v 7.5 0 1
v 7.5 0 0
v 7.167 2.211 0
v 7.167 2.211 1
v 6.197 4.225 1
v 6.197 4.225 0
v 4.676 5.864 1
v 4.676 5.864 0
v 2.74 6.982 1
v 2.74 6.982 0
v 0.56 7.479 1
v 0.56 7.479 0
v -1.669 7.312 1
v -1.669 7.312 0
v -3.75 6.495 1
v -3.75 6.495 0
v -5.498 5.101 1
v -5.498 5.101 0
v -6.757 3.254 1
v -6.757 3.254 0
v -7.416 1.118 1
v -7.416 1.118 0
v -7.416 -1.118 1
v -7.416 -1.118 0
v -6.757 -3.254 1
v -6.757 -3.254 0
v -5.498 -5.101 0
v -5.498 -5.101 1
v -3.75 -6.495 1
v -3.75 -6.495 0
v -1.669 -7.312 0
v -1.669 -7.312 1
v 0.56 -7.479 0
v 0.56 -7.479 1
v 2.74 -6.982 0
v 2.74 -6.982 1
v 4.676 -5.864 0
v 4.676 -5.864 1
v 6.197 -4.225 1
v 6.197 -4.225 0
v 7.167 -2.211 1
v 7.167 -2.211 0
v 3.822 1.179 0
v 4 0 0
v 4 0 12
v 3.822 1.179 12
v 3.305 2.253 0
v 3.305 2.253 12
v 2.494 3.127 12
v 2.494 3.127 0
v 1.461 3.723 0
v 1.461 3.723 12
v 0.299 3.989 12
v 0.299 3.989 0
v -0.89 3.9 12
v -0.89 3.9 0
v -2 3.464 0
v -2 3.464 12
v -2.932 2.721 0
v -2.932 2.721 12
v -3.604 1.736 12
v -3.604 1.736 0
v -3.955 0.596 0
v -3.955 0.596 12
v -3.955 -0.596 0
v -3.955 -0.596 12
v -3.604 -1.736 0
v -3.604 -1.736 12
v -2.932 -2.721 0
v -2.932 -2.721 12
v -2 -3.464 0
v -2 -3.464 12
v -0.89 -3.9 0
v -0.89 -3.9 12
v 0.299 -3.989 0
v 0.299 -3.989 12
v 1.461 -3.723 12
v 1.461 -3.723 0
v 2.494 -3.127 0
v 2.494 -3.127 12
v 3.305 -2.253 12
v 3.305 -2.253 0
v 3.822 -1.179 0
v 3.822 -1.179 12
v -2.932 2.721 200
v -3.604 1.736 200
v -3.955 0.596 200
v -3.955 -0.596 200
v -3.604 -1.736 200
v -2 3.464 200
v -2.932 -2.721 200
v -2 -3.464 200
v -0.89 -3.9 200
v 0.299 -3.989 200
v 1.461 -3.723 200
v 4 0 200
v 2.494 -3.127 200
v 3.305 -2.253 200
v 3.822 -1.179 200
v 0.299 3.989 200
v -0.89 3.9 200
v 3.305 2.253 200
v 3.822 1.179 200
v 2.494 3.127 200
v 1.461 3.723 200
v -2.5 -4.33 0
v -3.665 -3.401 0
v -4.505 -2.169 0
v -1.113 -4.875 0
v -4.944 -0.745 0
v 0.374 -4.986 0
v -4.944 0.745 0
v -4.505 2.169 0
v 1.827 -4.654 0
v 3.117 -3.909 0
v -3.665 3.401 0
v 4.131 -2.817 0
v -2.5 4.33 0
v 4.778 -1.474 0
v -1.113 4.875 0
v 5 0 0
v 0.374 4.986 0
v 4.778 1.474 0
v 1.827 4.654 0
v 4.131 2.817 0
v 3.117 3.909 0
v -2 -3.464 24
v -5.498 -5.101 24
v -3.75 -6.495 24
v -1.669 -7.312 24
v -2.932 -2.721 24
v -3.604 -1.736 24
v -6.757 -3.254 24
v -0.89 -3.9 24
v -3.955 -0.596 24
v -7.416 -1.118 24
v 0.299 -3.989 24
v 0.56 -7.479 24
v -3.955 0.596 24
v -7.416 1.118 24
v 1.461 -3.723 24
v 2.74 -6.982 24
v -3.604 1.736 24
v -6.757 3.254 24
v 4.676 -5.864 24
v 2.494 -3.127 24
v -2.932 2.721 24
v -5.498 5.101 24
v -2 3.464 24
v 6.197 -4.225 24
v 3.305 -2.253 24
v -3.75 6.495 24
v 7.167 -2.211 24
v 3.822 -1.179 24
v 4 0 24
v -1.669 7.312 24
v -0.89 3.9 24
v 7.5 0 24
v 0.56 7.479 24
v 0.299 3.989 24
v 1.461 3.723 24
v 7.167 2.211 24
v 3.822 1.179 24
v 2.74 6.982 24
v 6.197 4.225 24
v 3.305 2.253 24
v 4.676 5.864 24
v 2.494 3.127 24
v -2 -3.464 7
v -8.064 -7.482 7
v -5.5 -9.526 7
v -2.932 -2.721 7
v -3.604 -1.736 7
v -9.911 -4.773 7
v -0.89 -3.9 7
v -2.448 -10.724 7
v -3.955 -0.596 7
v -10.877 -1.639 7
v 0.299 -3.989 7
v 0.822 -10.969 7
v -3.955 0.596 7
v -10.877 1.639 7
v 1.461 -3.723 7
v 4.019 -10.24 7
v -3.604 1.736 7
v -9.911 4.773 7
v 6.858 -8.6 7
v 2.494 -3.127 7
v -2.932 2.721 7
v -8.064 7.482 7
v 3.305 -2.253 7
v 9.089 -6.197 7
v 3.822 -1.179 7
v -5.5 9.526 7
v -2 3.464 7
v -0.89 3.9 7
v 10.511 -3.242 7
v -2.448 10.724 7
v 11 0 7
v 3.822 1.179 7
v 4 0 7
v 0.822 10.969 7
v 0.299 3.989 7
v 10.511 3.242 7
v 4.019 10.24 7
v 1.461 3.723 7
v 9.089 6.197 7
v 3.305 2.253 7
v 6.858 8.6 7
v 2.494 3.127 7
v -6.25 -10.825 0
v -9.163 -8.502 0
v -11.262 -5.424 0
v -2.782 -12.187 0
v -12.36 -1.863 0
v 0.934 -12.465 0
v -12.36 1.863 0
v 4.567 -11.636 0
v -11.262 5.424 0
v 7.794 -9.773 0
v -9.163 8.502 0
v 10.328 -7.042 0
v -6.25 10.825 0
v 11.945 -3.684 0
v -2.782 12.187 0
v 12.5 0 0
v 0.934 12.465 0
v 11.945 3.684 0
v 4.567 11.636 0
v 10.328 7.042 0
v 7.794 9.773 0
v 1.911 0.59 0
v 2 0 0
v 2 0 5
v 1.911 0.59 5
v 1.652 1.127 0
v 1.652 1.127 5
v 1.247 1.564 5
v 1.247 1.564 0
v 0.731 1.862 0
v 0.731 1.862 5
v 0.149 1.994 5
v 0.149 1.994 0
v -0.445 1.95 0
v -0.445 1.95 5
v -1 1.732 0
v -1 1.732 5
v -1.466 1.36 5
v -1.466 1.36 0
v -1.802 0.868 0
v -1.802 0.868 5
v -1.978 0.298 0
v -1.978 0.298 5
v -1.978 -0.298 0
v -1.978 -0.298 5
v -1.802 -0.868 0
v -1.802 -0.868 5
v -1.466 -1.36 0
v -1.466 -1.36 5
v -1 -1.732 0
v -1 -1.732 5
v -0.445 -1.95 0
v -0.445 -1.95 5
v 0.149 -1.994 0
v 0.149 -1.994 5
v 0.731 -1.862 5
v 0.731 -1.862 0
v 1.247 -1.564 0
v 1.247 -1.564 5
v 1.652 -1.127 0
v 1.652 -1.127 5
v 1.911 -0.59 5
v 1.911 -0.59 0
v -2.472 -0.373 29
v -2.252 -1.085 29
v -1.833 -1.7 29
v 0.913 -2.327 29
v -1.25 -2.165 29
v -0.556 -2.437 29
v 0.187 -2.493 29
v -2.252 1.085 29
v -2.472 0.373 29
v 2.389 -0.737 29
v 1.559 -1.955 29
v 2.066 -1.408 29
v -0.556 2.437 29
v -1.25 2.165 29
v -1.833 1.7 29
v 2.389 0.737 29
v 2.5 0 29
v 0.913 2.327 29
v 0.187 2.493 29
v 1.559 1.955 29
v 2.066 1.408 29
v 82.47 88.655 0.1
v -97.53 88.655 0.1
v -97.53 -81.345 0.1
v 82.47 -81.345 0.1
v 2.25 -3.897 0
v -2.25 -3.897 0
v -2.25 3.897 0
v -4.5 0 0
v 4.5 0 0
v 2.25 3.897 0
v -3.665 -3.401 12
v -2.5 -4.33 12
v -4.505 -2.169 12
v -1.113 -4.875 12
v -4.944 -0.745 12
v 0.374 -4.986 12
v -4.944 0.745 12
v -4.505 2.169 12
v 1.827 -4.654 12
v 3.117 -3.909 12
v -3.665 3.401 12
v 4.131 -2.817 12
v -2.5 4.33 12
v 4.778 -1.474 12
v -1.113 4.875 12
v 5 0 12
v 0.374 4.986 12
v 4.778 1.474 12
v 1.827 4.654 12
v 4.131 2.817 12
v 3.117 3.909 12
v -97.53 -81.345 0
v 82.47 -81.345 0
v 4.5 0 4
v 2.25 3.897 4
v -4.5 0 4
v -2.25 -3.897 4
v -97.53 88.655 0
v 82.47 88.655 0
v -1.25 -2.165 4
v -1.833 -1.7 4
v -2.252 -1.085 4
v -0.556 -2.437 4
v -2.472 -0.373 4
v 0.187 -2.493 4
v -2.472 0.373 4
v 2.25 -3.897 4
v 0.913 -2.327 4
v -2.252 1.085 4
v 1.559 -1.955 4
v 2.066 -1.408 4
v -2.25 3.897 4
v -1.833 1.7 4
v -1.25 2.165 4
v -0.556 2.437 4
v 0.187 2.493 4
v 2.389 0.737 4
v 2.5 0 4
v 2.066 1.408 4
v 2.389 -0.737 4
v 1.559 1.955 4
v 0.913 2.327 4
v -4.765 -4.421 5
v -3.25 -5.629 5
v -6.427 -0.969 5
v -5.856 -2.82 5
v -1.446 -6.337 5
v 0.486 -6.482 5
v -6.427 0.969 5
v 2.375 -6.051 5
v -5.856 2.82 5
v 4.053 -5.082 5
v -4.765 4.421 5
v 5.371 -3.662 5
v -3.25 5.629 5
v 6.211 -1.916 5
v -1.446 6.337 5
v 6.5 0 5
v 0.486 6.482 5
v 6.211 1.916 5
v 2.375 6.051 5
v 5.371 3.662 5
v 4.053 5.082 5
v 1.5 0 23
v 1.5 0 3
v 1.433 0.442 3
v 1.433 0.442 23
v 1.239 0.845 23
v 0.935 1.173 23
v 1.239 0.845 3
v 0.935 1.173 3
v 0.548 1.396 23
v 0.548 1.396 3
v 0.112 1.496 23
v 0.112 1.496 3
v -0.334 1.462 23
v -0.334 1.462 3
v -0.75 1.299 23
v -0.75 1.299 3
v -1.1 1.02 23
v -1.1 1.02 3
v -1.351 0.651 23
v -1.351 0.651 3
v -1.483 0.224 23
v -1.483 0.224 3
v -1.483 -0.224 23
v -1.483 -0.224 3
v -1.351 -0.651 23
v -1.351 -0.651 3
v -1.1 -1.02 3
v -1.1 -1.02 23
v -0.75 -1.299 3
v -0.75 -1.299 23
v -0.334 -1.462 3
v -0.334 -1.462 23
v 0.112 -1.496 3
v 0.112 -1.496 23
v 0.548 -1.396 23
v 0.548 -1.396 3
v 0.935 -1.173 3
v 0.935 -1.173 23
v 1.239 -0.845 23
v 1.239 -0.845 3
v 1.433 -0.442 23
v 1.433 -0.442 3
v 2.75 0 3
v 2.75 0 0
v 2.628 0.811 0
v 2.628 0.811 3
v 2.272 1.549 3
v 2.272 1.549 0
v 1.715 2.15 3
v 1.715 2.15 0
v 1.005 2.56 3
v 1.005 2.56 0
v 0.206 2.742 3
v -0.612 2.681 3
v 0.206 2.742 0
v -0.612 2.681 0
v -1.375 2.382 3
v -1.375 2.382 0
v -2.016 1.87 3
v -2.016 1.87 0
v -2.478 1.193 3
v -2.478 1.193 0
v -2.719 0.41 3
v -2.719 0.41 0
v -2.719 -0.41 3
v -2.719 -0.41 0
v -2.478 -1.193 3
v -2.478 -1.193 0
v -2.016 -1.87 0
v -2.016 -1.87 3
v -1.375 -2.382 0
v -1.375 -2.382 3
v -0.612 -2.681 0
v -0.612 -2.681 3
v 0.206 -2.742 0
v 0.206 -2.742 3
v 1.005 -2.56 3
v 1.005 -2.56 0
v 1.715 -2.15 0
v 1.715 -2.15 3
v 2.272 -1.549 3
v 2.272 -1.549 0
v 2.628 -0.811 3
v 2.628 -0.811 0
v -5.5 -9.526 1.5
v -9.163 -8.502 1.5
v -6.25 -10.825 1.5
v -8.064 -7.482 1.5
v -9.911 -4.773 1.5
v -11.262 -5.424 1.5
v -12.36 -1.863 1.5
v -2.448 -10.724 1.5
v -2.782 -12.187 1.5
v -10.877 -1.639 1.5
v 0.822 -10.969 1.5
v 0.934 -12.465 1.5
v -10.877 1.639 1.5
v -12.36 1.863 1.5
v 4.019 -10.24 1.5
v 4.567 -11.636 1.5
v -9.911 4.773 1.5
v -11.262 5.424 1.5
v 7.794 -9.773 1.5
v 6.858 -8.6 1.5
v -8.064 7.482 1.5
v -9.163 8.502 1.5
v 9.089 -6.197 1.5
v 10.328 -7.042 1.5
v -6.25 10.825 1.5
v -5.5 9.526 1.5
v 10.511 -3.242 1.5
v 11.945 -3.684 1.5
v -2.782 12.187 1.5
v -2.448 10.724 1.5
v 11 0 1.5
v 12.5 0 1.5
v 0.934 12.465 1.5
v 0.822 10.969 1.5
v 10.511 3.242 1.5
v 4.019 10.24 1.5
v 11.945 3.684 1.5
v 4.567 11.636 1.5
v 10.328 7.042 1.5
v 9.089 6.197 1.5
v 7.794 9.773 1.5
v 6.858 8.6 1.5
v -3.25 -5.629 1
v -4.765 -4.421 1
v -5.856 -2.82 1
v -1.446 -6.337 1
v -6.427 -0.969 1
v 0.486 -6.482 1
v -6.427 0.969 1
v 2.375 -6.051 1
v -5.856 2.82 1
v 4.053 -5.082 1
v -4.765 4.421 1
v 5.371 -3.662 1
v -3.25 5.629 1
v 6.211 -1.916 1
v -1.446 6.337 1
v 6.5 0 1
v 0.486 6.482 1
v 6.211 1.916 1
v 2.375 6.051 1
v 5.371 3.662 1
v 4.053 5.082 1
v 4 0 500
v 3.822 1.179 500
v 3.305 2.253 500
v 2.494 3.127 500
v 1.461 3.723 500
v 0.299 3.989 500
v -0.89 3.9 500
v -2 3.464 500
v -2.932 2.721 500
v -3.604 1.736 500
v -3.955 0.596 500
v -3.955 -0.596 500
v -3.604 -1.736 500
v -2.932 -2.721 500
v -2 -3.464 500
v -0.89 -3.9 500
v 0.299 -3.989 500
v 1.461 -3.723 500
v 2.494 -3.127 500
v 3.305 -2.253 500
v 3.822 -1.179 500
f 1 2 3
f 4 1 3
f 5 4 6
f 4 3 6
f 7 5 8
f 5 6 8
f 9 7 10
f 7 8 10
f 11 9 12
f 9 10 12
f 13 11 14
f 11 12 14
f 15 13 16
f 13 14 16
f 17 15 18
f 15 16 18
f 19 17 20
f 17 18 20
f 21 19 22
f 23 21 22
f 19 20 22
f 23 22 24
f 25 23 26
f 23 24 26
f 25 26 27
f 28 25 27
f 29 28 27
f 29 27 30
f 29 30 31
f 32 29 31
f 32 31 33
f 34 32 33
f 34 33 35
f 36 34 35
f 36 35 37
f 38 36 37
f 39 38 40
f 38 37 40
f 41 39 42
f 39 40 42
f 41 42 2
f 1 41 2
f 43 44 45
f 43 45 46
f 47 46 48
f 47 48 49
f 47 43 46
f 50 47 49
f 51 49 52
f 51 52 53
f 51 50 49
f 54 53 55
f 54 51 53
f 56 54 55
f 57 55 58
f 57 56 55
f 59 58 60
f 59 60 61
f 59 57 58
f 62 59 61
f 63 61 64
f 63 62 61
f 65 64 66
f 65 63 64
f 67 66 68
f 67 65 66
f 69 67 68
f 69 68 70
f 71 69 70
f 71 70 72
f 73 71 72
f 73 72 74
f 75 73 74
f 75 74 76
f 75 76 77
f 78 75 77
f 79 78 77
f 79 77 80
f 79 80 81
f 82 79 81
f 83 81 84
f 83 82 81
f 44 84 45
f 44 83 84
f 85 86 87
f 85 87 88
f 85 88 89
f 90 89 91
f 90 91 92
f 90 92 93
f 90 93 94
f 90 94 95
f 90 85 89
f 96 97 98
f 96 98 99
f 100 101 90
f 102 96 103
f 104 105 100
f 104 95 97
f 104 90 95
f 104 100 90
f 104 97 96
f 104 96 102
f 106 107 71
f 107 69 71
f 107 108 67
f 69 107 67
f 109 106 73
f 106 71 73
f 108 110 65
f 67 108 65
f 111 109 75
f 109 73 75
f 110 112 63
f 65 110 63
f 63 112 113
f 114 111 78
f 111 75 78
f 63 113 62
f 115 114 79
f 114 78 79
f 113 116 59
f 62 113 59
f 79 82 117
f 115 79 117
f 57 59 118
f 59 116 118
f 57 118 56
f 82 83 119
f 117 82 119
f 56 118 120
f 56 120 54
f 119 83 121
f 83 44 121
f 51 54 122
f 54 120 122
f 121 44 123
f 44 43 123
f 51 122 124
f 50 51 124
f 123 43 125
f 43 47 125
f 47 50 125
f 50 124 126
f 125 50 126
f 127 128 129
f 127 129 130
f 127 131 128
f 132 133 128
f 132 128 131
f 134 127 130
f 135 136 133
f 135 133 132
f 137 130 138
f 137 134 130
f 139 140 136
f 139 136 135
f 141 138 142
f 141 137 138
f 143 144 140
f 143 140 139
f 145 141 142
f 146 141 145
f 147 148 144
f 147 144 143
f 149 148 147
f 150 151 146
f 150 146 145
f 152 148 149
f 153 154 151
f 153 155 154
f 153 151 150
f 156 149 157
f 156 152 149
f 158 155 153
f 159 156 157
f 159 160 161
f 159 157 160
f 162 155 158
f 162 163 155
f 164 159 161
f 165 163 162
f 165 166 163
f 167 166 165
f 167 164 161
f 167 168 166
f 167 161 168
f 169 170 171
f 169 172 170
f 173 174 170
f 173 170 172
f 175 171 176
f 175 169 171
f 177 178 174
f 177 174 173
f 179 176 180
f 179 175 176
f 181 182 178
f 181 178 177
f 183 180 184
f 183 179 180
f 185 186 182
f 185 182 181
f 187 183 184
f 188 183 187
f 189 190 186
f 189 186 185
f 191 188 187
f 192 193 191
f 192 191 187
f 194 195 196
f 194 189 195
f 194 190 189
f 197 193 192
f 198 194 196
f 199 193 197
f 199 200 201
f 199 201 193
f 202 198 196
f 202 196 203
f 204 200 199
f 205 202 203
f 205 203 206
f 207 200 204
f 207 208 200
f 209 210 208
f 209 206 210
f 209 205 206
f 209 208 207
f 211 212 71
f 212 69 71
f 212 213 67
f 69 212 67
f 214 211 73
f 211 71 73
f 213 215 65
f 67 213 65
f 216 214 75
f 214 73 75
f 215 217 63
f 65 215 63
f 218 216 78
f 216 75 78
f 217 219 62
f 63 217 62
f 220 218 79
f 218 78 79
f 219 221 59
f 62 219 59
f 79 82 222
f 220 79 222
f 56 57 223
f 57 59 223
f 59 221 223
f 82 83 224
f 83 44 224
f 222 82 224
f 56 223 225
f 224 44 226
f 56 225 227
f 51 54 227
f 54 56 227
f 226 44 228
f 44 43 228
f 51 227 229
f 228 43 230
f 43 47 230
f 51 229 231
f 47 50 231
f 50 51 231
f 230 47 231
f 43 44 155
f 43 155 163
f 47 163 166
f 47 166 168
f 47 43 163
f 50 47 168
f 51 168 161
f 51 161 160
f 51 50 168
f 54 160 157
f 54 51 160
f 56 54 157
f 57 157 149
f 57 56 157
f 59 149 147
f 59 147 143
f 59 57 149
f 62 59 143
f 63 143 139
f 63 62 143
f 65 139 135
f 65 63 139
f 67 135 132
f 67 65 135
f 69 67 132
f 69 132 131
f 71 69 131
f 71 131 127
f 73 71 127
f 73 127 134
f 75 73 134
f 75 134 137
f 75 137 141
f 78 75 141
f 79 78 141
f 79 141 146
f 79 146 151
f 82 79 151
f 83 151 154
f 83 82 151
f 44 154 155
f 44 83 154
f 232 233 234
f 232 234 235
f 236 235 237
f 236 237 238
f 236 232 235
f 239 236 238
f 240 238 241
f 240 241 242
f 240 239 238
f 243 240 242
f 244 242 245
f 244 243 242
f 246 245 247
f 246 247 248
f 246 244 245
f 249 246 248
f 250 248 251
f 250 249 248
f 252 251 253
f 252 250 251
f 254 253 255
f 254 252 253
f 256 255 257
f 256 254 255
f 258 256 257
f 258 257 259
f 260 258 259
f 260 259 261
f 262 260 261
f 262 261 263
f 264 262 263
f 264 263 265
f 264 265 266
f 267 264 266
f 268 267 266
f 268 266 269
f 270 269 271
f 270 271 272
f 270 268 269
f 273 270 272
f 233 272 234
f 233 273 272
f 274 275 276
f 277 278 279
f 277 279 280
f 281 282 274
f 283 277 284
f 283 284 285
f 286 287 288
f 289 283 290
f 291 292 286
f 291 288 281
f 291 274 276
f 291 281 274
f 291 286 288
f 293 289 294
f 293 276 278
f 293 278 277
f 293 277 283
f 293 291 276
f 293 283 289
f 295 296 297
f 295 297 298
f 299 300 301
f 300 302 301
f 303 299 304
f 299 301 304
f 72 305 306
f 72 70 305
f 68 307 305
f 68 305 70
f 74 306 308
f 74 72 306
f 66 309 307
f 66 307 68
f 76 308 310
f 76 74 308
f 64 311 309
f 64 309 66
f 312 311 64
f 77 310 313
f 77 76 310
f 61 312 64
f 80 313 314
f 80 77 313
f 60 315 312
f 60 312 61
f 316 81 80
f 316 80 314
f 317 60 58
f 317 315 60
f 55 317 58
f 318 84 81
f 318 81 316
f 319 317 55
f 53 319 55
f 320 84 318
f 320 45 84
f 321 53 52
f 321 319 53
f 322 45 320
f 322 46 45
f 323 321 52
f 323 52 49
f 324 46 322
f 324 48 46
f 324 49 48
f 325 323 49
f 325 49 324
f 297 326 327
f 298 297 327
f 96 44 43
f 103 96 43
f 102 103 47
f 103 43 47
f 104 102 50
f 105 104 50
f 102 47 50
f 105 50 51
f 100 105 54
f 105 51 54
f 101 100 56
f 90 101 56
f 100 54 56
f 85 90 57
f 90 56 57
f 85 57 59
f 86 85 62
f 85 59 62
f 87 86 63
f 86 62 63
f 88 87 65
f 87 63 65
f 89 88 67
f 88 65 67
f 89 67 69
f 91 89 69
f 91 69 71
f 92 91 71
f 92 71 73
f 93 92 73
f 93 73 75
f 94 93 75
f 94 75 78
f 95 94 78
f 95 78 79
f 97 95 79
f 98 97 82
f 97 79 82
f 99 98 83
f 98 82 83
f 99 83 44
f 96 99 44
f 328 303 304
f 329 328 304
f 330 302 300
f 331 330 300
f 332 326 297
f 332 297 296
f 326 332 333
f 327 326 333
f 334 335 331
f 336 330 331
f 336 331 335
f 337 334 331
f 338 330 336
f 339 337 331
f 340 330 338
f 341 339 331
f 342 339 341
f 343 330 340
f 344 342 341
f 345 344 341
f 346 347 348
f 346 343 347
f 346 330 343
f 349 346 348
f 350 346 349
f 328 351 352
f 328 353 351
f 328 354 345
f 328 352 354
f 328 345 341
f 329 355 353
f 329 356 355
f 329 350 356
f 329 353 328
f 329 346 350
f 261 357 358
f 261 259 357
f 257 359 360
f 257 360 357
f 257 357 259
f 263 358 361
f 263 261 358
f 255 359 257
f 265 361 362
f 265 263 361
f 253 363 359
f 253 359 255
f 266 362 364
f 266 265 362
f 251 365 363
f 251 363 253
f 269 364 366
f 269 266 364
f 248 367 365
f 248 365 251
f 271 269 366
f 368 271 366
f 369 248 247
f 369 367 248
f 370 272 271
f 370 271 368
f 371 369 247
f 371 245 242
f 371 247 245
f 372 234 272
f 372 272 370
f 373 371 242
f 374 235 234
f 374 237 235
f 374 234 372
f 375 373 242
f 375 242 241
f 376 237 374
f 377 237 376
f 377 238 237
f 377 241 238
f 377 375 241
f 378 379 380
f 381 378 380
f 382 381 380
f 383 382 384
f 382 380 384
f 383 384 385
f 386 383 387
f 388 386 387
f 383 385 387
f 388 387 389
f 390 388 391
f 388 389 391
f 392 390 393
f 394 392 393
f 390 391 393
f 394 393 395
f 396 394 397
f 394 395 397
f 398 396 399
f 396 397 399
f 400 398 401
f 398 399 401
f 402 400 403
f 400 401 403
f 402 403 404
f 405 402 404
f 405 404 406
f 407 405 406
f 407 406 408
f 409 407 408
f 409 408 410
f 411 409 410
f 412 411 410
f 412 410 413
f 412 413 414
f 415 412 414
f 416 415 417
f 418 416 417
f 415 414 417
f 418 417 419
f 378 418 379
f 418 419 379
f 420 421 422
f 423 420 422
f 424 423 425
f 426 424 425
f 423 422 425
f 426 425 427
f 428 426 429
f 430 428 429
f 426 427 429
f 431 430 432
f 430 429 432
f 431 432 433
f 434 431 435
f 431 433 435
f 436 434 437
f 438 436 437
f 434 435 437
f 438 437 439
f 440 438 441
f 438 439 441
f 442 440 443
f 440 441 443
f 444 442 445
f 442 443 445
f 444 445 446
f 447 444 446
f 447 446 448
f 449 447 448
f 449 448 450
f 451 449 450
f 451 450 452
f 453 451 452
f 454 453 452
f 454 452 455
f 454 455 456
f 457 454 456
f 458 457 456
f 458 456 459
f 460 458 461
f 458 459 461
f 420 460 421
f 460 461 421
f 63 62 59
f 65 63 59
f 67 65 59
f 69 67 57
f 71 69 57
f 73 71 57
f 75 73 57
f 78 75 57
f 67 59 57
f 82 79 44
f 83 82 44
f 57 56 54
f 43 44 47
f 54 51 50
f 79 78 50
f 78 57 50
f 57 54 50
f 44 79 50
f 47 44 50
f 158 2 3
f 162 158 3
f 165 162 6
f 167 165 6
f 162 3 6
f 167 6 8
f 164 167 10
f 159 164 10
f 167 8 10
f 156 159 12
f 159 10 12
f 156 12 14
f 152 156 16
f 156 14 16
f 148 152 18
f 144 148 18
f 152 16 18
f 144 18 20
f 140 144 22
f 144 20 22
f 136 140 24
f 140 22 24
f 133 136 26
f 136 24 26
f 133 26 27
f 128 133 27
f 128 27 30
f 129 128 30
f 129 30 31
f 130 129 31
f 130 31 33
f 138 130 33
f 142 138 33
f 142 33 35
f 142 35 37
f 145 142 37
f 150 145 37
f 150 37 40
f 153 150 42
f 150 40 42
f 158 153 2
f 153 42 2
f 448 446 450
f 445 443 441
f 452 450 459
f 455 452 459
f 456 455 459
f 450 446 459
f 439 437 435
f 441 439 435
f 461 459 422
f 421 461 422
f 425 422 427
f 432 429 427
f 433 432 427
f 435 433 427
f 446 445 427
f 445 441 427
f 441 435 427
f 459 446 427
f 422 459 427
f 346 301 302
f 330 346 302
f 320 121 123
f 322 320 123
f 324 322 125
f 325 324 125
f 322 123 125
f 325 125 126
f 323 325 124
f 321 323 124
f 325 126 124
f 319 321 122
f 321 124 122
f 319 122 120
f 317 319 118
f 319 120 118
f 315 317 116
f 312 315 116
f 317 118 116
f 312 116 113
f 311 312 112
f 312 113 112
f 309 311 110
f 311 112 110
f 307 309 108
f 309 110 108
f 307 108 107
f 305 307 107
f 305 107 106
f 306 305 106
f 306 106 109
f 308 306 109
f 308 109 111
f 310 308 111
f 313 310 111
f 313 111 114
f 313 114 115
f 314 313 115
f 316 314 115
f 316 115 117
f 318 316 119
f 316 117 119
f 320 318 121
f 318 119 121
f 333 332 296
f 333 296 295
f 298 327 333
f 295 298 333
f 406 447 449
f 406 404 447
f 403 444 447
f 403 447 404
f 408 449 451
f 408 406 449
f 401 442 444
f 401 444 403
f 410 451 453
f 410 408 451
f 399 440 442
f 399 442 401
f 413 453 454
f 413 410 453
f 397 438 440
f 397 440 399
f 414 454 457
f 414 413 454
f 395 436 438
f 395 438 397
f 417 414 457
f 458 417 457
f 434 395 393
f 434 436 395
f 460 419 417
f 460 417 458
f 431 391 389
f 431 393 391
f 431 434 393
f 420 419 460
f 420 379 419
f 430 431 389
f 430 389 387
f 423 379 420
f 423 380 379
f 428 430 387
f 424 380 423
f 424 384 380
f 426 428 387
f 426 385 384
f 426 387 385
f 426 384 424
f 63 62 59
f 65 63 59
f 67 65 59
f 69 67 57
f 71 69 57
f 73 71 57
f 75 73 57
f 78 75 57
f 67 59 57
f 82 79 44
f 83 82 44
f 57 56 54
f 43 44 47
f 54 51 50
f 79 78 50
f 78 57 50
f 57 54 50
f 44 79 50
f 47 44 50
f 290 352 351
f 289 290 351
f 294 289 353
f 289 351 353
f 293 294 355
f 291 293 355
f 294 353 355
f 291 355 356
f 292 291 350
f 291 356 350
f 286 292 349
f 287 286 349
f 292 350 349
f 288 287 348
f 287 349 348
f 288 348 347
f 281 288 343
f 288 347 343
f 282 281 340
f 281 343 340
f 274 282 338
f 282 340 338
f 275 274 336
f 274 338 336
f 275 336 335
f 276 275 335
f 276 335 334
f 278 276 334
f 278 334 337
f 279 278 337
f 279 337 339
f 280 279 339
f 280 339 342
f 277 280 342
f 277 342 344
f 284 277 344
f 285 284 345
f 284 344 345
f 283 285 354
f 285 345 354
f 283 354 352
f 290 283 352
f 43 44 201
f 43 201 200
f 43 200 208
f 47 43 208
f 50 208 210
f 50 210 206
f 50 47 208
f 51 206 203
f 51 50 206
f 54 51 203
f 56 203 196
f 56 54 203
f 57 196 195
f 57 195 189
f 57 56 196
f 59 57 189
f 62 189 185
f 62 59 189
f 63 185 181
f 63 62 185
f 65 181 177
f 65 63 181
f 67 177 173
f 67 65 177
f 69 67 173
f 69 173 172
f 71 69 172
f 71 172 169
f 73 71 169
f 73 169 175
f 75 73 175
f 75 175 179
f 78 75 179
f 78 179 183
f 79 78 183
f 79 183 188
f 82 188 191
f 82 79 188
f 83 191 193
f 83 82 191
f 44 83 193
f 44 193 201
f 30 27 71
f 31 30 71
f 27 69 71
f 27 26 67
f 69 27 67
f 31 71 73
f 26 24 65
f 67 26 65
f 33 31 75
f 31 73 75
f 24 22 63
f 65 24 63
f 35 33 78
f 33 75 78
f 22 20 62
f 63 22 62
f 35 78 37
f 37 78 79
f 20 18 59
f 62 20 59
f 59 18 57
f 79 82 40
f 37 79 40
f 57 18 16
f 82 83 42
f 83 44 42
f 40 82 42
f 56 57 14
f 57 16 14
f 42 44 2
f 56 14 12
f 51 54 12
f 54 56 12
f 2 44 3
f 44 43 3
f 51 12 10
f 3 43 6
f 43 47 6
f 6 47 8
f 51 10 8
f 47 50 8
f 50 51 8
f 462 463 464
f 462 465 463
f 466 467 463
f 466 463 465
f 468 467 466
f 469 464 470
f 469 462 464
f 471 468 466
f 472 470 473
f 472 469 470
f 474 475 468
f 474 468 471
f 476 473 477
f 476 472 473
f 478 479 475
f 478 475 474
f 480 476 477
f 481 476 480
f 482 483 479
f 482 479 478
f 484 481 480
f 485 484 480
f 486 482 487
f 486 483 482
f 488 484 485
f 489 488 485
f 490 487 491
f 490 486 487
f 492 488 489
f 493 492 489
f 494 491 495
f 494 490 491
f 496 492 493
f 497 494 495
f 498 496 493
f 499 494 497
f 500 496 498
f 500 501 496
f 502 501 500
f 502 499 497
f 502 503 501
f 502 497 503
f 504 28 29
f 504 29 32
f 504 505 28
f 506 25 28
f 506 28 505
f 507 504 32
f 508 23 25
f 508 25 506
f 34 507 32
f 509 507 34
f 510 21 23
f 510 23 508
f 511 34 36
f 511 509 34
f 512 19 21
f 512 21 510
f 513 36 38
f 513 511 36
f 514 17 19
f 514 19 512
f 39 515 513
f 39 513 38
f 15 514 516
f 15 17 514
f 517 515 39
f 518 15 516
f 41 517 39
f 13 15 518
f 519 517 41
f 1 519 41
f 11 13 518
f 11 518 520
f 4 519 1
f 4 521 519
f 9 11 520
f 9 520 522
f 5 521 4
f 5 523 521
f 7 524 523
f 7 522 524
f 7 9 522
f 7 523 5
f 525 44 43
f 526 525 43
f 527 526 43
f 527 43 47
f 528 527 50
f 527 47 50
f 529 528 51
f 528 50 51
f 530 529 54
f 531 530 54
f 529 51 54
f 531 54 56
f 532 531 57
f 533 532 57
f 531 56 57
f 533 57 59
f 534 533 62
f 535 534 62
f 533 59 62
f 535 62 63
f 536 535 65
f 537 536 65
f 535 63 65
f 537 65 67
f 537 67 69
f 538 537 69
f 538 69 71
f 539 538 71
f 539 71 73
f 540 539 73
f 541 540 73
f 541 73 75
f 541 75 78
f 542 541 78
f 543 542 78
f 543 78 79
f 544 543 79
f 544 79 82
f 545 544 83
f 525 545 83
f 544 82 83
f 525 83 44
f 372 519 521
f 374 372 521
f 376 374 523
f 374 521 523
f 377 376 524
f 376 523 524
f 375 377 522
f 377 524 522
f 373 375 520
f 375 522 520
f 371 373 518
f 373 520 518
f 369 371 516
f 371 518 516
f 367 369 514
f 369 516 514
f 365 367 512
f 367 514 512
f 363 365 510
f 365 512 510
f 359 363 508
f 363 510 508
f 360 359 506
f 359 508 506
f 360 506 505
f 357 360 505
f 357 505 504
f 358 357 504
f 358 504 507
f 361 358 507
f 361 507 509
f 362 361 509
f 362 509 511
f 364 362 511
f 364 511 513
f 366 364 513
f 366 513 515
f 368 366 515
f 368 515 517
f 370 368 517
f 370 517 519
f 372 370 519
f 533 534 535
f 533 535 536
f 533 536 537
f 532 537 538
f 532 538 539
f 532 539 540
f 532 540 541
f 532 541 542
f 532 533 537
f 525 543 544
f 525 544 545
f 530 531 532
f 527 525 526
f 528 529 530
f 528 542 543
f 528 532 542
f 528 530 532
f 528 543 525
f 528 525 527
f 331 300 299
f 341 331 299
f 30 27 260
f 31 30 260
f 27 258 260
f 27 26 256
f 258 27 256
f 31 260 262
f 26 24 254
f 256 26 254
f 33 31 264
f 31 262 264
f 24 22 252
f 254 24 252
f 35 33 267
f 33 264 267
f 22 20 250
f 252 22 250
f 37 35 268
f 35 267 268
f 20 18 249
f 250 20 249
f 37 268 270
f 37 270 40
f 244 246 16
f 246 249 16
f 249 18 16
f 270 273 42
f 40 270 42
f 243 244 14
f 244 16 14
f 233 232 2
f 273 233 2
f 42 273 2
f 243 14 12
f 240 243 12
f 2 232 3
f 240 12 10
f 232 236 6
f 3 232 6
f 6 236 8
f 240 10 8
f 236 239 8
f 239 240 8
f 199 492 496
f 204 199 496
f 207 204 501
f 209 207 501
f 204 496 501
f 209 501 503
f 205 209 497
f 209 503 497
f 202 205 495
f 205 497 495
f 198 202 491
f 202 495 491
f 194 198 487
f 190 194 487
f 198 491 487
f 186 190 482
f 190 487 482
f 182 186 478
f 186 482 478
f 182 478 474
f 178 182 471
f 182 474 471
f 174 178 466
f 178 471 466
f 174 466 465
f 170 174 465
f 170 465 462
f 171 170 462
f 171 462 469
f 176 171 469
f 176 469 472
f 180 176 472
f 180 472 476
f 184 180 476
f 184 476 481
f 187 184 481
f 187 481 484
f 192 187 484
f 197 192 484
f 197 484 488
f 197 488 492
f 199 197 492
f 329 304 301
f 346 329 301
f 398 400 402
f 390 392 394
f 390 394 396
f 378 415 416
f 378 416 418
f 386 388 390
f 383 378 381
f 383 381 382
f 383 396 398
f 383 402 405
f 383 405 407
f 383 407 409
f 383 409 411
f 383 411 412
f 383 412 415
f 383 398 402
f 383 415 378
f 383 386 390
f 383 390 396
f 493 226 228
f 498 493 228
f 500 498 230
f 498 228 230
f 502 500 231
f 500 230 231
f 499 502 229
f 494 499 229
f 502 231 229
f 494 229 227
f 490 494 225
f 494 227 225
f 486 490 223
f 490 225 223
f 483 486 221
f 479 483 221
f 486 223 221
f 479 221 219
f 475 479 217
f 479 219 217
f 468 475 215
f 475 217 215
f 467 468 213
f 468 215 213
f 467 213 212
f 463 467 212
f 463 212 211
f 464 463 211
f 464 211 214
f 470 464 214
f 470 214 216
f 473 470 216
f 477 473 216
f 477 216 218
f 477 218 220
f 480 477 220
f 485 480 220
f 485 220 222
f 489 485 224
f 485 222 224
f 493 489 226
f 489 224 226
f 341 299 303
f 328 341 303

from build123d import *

# Parameters (mm, degrees)
F0_R      = 11
F0_R_2    = 4
F1_DEPTH  = 7
F0_R_3    = 12.5
F2_DEPTH  = 1.5
F3_R      = 6.5
F3_R_2    = 2
F4_DEPTH  = 5
F3_R_3    = 7.5
F5_DEPTH  = 1
F6_R      = 5
F6_R_2    = 4
F7_DEPTH  = 12
F8_R      = 4
F9_DEPTH  = 500
F10_DEPTH = 200
F12_DEPTH = 4
F13_R     = 2.5
F14_DEPTH = 25
F15_R     = 2.75
F16_DEPTH = 3
F17_R     = 1.5
F18_DEPTH = 20
F19_R     = 7.5
F19_R_2   = 4
F20_DEPTH = 24
F21_W     = 180
F21_H     = 170
F22_DEPTH = 0.1


with BuildPart() as f1:
    # F0 (on Top) → F1 (new body)
    with BuildSketch(Plane.XY):
        Circle(F0_R)
        Circle(F0_R_2, mode=Mode.SUBTRACT)
    extrude(amount=F1_DEPTH)

    # F0 (on Top) → F2 (join)
    with BuildSketch(Plane.XY):
        Circle(F0_R_3)
        Circle(F0_R, mode=Mode.SUBTRACT)
    extrude(amount=F2_DEPTH)


with BuildPart() as f4:
    # F3 (on Top) → F4 (new body)
    with BuildSketch(Plane.XY):
        Circle(F3_R)
        Circle(F3_R_2, mode=Mode.SUBTRACT)
    extrude(amount=F4_DEPTH)

    # F3 (on Top) → F5 (join)
    with BuildSketch(Plane.XY):
        Circle(F3_R_3)
        Circle(F3_R, mode=Mode.SUBTRACT)
    extrude(amount=F5_DEPTH)


with BuildPart() as f7:
    # F6 (on Top) → F7 (new body)
    with BuildSketch(Plane.XY):
        Circle(F6_R)
        Circle(F6_R_2, mode=Mode.SUBTRACT)
    extrude(amount=F7_DEPTH)


with BuildPart() as f9:
    # F8 (on Top) → F9 (new body)
    with BuildSketch(Plane.XY):
        Circle(F8_R)
    extrude(amount=F9_DEPTH)


with BuildPart() as f10:
    # F8 (on Top) → F10 (new body)
    with BuildSketch(Plane.XY):
        Circle(F8_R)
    extrude(amount=F10_DEPTH)


with BuildPart() as f12:
    # F11 (on Top) → F12 (new body)
    with BuildSketch(Plane.XY):
        Polygon((-2.25, -3.897114317), (2.25, -3.897114317), (4.5, 0), (2.25, 3.897114317), (-2.25, 3.897114317), (-4.5, 0), align=None)
    extrude(amount=F12_DEPTH)

    # F13 (on face) → F14 (join)
    with BuildSketch(Plane.XY.offset(4)):
        Circle(F13_R)
    extrude(amount=F14_DEPTH)


with BuildPart() as f16:
    # F15 (on Top) → F16 (new body)
    with BuildSketch(Plane.XY):
        Circle(F15_R)
    extrude(amount=F16_DEPTH)

    # F17 (on face) → F18 (join)
    with BuildSketch(Plane.XY.offset(3)):
        Circle(F17_R)
    extrude(amount=F18_DEPTH)


with BuildPart() as f20:
    # F19 (on Top) → F20 (new body)
    with BuildSketch(Plane.XY):
        Circle(F19_R)
        Circle(F19_R_2, mode=Mode.SUBTRACT)
    extrude(amount=F20_DEPTH)


with BuildPart() as f22:
    # F21 (on Top) → F22 (new body)
    with BuildSketch(Plane.XY):
        with Locations((-7.5304363951, 3.6545433104)):
            Rectangle(F21_W, F21_H)
    extrude(amount=F22_DEPTH)


solid = Compound([f1.part, f4.part, f7.part, f9.part, f10.part, f12.part, f16.part, f20.part, f22.part])
